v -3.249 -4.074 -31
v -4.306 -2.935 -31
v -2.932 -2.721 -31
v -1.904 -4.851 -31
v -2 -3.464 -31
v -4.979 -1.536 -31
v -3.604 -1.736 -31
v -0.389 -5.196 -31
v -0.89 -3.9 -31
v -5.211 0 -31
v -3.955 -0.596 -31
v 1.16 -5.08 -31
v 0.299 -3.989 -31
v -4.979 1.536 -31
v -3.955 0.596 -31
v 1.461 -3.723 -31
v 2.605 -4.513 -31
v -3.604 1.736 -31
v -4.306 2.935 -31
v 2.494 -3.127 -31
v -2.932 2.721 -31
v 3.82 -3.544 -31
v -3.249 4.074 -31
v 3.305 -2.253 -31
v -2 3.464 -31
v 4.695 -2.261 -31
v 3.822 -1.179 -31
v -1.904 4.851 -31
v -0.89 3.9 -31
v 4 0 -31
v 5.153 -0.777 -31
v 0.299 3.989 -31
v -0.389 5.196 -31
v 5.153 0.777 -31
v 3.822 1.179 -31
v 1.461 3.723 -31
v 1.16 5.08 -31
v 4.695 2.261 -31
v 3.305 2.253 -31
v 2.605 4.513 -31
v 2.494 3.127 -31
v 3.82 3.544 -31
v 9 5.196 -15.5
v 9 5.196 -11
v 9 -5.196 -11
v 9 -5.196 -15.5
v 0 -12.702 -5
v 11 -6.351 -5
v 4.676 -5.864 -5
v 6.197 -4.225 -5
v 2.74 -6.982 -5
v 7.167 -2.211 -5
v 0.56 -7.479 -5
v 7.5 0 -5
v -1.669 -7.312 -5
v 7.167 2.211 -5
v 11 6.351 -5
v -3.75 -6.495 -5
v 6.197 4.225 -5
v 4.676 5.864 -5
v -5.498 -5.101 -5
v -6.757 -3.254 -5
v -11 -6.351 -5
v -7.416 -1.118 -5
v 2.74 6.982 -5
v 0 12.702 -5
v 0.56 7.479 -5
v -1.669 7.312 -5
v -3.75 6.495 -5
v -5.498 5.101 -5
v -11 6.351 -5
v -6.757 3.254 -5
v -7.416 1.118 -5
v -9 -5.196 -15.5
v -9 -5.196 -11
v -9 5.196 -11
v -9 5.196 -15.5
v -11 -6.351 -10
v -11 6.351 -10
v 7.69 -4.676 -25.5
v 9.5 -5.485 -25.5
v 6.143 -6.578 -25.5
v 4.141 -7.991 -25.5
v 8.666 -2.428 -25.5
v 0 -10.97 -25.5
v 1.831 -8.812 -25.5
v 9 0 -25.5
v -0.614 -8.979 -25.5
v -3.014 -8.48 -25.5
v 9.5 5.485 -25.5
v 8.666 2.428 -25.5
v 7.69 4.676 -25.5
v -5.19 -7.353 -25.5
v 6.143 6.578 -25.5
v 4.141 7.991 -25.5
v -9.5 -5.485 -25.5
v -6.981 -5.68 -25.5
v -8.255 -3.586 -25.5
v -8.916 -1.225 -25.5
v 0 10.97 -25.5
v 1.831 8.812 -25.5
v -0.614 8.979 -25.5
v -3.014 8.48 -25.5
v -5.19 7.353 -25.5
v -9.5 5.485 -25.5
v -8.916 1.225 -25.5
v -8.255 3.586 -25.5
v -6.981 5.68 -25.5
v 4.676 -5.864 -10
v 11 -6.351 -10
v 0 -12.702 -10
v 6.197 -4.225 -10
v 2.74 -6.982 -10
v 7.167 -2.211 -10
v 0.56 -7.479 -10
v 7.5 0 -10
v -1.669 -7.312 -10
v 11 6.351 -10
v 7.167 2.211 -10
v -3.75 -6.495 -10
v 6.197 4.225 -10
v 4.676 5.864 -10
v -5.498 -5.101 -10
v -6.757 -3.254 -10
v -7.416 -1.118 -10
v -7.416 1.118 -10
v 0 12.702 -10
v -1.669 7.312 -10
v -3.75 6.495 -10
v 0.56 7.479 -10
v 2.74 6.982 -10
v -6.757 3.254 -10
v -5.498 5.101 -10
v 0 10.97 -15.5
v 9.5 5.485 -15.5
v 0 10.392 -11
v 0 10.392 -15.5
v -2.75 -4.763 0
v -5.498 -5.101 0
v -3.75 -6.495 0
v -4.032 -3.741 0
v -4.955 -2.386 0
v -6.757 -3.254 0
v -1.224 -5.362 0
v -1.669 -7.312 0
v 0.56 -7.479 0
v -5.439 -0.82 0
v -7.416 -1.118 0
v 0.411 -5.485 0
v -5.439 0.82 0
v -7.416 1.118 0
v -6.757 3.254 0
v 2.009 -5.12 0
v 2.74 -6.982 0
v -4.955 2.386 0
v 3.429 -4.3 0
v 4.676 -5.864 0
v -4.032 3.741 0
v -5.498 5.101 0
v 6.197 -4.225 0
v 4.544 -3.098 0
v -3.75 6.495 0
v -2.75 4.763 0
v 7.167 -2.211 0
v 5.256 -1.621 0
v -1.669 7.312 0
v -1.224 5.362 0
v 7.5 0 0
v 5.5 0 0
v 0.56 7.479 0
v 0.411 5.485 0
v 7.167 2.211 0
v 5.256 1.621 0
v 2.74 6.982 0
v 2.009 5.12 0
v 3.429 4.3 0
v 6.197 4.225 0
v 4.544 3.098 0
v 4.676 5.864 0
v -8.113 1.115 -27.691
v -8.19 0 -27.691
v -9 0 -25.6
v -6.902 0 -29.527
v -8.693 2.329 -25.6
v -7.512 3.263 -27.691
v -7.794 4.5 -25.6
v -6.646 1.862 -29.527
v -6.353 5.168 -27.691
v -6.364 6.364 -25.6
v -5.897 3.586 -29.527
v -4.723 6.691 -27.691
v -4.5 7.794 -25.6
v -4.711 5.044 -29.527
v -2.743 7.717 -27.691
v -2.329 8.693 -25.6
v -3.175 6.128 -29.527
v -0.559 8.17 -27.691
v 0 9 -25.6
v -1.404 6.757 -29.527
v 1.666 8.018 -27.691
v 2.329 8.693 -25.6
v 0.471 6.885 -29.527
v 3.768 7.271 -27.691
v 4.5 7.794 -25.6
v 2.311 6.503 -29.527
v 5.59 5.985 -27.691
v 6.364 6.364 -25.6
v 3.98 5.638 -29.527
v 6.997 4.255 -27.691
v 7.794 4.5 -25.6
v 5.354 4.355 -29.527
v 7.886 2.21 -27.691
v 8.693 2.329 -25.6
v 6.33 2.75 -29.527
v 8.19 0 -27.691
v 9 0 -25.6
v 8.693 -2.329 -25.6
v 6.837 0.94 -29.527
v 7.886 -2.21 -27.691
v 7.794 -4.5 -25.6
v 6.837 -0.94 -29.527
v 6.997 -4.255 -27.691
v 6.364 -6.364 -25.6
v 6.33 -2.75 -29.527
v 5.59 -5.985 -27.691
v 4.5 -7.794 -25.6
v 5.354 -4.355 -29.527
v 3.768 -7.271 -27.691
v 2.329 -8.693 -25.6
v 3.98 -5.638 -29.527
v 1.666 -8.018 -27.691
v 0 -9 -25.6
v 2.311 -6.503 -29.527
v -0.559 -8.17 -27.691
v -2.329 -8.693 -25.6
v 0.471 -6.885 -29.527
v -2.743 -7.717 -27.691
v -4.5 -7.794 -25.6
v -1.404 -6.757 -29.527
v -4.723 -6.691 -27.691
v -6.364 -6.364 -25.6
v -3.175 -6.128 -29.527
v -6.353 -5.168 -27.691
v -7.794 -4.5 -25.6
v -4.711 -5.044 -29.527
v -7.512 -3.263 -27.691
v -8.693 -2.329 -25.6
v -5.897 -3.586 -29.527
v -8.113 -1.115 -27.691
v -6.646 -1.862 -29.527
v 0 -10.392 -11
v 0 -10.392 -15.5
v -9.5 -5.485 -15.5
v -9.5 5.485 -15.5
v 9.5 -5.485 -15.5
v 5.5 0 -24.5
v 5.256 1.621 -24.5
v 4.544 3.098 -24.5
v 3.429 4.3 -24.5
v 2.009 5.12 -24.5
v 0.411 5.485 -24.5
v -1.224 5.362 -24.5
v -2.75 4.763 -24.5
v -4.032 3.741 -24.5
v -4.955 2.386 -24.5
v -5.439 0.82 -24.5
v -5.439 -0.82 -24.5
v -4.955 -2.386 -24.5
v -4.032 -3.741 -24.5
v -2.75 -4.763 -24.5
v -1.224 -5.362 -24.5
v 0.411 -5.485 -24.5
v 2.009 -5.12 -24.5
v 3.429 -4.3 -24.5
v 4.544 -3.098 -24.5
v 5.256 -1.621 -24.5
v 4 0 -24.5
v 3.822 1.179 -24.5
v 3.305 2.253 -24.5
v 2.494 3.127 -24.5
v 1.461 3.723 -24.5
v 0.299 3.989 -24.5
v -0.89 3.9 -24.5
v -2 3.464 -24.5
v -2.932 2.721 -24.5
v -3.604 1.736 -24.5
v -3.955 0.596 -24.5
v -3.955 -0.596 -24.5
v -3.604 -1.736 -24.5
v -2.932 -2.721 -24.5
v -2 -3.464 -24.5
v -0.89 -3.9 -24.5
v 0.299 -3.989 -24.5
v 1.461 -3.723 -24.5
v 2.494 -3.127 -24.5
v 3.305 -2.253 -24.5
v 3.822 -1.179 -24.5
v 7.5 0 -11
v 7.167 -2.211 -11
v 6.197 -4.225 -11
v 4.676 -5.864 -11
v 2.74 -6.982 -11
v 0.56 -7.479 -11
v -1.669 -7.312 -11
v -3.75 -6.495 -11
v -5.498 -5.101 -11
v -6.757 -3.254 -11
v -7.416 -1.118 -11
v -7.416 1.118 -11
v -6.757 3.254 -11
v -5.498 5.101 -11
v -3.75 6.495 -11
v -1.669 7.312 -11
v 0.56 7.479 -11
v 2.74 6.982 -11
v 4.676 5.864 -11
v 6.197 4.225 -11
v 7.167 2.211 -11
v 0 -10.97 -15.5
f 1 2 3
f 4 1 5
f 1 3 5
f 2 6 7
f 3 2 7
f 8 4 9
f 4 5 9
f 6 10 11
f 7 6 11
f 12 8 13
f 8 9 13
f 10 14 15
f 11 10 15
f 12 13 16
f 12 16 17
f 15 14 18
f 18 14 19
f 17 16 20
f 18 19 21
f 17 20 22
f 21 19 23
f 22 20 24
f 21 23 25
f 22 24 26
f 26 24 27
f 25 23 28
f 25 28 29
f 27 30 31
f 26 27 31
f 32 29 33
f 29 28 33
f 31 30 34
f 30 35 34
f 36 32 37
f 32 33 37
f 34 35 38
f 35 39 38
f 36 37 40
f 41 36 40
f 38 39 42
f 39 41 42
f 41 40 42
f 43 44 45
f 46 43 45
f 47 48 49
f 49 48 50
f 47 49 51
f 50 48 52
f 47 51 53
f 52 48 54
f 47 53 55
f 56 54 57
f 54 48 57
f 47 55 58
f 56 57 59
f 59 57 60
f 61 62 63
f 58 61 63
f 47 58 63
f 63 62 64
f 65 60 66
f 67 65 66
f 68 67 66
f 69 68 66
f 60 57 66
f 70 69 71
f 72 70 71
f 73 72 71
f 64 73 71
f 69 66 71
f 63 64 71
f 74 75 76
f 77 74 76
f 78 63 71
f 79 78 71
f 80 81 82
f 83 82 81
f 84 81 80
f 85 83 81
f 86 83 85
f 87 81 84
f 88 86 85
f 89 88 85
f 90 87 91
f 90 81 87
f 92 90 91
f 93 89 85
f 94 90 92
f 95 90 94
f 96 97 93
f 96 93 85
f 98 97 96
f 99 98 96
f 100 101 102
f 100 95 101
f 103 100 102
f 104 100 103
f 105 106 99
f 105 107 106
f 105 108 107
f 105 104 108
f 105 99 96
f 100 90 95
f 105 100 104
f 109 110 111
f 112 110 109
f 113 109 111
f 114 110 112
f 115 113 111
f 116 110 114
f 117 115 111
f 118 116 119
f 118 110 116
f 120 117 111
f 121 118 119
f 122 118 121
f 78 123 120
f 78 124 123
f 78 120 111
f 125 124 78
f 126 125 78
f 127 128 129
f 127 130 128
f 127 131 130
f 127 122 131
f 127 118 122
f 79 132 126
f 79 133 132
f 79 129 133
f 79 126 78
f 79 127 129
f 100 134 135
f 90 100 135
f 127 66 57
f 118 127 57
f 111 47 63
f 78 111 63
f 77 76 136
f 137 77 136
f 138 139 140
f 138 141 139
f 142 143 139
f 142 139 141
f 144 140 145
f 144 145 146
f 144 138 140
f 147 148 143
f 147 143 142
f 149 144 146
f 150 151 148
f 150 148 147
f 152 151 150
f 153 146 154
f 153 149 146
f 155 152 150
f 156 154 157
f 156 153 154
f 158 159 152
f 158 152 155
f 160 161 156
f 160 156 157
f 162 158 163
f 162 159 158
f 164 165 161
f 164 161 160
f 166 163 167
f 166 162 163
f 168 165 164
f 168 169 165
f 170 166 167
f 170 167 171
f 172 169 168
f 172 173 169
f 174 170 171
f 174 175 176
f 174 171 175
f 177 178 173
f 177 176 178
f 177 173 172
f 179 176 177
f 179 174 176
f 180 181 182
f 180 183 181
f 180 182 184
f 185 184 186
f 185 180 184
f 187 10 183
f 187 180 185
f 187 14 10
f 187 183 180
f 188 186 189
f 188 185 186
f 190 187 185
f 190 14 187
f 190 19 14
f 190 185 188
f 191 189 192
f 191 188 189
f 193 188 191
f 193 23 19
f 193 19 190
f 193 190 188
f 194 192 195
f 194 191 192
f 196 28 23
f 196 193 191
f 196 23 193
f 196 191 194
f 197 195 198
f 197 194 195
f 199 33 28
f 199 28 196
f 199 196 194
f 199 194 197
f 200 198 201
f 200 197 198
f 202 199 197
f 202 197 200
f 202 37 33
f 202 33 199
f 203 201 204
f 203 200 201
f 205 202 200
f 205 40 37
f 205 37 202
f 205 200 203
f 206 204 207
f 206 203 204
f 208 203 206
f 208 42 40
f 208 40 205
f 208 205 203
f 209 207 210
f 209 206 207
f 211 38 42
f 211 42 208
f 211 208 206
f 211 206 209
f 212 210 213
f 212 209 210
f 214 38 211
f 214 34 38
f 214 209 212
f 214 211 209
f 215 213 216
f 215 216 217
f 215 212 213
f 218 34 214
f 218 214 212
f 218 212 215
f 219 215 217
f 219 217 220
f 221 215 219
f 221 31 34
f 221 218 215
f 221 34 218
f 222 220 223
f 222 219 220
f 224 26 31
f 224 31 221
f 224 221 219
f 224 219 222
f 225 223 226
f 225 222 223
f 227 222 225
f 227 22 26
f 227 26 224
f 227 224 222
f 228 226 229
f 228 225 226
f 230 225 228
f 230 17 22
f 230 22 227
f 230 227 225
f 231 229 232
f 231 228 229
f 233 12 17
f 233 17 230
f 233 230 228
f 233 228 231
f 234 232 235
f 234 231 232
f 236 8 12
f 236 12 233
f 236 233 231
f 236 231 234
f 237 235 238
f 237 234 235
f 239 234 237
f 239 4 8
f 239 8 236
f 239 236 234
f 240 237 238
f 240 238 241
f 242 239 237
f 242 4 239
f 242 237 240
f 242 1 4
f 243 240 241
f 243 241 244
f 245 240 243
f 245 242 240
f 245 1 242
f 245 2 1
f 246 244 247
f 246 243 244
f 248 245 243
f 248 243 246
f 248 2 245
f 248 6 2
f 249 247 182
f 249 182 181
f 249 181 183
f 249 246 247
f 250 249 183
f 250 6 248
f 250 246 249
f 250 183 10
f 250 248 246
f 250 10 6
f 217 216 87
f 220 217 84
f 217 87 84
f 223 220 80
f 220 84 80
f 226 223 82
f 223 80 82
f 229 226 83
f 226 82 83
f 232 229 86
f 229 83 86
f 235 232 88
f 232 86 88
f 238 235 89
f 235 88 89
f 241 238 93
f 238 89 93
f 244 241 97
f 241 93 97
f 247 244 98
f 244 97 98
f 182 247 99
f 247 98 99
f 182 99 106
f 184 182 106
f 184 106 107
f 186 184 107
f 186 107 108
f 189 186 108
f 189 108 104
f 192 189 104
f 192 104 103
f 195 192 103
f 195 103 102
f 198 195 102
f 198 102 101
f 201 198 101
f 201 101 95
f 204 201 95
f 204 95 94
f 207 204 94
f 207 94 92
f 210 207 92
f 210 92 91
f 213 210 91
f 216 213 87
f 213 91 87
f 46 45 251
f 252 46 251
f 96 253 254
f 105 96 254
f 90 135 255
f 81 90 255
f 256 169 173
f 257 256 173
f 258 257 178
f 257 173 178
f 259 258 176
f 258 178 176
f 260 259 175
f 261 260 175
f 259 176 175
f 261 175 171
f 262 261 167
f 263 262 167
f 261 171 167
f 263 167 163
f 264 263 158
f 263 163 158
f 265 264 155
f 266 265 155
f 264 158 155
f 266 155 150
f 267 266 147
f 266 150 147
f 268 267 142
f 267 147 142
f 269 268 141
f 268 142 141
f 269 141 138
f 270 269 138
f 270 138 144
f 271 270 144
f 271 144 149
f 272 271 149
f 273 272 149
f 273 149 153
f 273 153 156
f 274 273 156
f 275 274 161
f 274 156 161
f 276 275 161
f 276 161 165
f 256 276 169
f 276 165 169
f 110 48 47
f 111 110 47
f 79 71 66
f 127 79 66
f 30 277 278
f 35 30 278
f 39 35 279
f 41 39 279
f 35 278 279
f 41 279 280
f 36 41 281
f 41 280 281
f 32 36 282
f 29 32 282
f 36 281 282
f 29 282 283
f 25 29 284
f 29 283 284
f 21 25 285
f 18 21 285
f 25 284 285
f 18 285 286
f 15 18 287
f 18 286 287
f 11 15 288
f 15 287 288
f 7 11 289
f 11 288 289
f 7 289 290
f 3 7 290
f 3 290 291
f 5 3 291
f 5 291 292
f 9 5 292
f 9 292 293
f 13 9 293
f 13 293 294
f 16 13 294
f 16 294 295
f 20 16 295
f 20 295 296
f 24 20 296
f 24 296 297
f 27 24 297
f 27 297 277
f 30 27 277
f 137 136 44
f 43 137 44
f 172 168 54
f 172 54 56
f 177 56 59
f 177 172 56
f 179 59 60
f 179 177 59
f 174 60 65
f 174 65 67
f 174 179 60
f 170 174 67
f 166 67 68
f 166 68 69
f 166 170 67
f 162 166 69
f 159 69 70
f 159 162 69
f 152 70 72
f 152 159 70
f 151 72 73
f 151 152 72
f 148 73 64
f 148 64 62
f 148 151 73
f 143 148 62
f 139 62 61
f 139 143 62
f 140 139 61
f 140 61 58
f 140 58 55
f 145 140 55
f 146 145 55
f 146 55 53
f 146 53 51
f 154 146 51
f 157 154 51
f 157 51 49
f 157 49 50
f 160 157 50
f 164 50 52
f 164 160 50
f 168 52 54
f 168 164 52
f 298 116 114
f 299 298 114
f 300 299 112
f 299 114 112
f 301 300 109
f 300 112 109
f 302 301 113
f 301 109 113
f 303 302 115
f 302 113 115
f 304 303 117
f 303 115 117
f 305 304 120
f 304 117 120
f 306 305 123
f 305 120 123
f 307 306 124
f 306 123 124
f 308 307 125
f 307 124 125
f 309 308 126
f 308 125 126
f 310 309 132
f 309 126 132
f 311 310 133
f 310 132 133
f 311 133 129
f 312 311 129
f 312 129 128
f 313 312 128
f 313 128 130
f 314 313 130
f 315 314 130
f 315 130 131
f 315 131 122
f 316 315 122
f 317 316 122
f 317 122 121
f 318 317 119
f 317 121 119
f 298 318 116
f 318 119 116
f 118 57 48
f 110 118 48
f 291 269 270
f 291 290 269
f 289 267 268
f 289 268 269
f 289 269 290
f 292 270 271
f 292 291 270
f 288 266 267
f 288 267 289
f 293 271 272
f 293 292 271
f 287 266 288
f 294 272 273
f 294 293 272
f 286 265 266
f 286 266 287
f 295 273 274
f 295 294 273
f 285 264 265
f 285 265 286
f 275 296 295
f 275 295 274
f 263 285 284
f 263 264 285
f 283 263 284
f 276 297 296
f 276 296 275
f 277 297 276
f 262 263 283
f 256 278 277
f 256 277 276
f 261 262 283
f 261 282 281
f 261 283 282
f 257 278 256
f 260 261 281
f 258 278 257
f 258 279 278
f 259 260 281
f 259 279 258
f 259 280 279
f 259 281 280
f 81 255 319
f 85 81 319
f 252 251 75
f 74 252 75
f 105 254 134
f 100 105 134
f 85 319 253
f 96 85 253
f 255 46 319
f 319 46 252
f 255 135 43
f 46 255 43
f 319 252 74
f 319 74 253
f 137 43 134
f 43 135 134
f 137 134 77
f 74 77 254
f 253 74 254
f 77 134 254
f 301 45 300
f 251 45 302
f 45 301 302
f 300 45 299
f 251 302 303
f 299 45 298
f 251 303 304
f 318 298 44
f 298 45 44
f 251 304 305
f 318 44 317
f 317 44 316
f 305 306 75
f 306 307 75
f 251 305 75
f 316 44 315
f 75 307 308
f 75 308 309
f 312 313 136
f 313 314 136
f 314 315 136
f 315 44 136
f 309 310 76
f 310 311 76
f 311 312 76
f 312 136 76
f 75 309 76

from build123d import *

# Parameters (mm, degrees)
SKETCH_1_R          = 7.5
EXTRUDE_1_DEPTH     = 5
EXTRUDE_2_DEPTH     = 5
SKETCH_3_R          = 7.5
EXTRUDE_3_DEPTH     = 1
EXTRUDE_4_DEPTH     = 4.5
EXTRUDE_5_DEPTH     = 10
SKETCH_6_R          = 9
EXTRUDE_6_DEPTH     = 0.1
DOME_1_FACE_RADIUS  = 9
DOME_1_HEIGHT       = 7
SKETCH_7_R          = 5.5
CUT_EXTRUDE_1_DEPTH = 24.5
SKETCH_8_R          = 4
CUT_EXTRUDE_2_DEPTH = 20
SKETCH_9_W          = 14.275225046
SKETCH_9_H          = 13.315546052
CUT_EXTRUDE_3_DEPTH = 20


with BuildPart() as part:
    # Эскиз1 → Вытянуть1 (new body)
    with BuildSketch(Plane.XY):
        Circle(SKETCH_1_R)
    extrude(amount=-EXTRUDE_1_DEPTH)

    # Эскиз2 → Вытянуть2 (add)
    with BuildSketch(Plane(origin=(0, 0, -5), x_dir=(-1, 0, 0), z_dir=(0, 0, -1))):
        Polygon((0, 12.701705922), (-11, 6.350852961), (-11, -6.350852961), (0, -12.701705922), (11, -6.350852961), (11, 6.350852961), align=None)
    extrude(amount=EXTRUDE_2_DEPTH)

    # Эскиз3 → Вытянуть3 (add)
    with BuildSketch(Plane(origin=(0, 0, -10), x_dir=(-1, 0, 0), z_dir=(0, 0, -1))):
        with Locations(Location((0, 0, 0), (0, 0, 180))):
            Circle(SKETCH_3_R)
    extrude(amount=EXTRUDE_3_DEPTH)

    # Эскиз4 → Вытянуть4 (add)
    with BuildSketch(Plane(origin=(0, 0, -11), x_dir=(-1, 0, 0), z_dir=(0, 0, -1))):
        Polygon((0, 10.392304845), (-9, 5.196152423), (-9, -5.196152423), (0, -10.392304845), (9, -5.196152423), (9, 5.196152423), align=None)
    extrude(amount=EXTRUDE_4_DEPTH)

    # Эскиз5 → Вытянуть5 (add)
    with BuildSketch(Plane(origin=(0, 0, -15.5), x_dir=(-1, 0, 0), z_dir=(0, 0, -1))):
        Polygon((0, 10.969655115), (-9.5, 5.484827557), (-9.5, -5.484827557), (0, -10.969655115), (9.5, -5.484827557), (9.5, 5.484827557), align=None)
    extrude(amount=EXTRUDE_5_DEPTH)

    # Эскиз6 → Вытянуть6 (add)
    with BuildSketch(Plane(origin=(0, 0, -25.5), x_dir=(-1, 0, 0), z_dir=(0, 0, -1))):
        with Locations(Location((0, 0, 0), (0, 0, 180))):
            Circle(SKETCH_6_R)
    extrude(amount=EXTRUDE_6_DEPTH)

    # Купол1: a dome of height H over a round flat face of radius A is a cap of a sphere of radius (A * A + H * H) / (2 * H)
    dome_1_r = (DOME_1_FACE_RADIUS * DOME_1_FACE_RADIUS + DOME_1_HEIGHT * DOME_1_HEIGHT) / (2 * DOME_1_HEIGHT)
    dome_1_base = Plane((0, 0, -25.6), z_dir=(0, 0, -1))
    with Locations(dome_1_base.offset(DOME_1_HEIGHT - dome_1_r)):
        dome_1_ball = Sphere(dome_1_r, mode=Mode.PRIVATE)
    add(split(dome_1_ball, bisect_by=dome_1_base, keep=Keep.TOP, mode=Mode.PRIVATE))

    # Эскиз7 → Вырез-Вытянуть1 (cut)
    with BuildSketch(Plane.XY):
        Circle(SKETCH_7_R)
    extrude(amount=-CUT_EXTRUDE_1_DEPTH, mode=Mode.SUBTRACT)

    # Эскиз8 → Вырез-Вытянуть2 (cut)
    with BuildSketch(Plane.XY.offset(-24.5)):
        Circle(SKETCH_8_R)
    extrude(amount=-CUT_EXTRUDE_2_DEPTH, mode=Mode.SUBTRACT)

    # Эскиз9 → Вырез-Вытянуть3 (cut)
    with BuildSketch(Plane.XY.offset(-31)):
        with Locations((-0.20992978, 0.329889654)):
            Rectangle(SKETCH_9_W, SKETCH_9_H)
    extrude(amount=-CUT_EXTRUDE_3_DEPTH, mode=Mode.SUBTRACT)


solid = part.part
